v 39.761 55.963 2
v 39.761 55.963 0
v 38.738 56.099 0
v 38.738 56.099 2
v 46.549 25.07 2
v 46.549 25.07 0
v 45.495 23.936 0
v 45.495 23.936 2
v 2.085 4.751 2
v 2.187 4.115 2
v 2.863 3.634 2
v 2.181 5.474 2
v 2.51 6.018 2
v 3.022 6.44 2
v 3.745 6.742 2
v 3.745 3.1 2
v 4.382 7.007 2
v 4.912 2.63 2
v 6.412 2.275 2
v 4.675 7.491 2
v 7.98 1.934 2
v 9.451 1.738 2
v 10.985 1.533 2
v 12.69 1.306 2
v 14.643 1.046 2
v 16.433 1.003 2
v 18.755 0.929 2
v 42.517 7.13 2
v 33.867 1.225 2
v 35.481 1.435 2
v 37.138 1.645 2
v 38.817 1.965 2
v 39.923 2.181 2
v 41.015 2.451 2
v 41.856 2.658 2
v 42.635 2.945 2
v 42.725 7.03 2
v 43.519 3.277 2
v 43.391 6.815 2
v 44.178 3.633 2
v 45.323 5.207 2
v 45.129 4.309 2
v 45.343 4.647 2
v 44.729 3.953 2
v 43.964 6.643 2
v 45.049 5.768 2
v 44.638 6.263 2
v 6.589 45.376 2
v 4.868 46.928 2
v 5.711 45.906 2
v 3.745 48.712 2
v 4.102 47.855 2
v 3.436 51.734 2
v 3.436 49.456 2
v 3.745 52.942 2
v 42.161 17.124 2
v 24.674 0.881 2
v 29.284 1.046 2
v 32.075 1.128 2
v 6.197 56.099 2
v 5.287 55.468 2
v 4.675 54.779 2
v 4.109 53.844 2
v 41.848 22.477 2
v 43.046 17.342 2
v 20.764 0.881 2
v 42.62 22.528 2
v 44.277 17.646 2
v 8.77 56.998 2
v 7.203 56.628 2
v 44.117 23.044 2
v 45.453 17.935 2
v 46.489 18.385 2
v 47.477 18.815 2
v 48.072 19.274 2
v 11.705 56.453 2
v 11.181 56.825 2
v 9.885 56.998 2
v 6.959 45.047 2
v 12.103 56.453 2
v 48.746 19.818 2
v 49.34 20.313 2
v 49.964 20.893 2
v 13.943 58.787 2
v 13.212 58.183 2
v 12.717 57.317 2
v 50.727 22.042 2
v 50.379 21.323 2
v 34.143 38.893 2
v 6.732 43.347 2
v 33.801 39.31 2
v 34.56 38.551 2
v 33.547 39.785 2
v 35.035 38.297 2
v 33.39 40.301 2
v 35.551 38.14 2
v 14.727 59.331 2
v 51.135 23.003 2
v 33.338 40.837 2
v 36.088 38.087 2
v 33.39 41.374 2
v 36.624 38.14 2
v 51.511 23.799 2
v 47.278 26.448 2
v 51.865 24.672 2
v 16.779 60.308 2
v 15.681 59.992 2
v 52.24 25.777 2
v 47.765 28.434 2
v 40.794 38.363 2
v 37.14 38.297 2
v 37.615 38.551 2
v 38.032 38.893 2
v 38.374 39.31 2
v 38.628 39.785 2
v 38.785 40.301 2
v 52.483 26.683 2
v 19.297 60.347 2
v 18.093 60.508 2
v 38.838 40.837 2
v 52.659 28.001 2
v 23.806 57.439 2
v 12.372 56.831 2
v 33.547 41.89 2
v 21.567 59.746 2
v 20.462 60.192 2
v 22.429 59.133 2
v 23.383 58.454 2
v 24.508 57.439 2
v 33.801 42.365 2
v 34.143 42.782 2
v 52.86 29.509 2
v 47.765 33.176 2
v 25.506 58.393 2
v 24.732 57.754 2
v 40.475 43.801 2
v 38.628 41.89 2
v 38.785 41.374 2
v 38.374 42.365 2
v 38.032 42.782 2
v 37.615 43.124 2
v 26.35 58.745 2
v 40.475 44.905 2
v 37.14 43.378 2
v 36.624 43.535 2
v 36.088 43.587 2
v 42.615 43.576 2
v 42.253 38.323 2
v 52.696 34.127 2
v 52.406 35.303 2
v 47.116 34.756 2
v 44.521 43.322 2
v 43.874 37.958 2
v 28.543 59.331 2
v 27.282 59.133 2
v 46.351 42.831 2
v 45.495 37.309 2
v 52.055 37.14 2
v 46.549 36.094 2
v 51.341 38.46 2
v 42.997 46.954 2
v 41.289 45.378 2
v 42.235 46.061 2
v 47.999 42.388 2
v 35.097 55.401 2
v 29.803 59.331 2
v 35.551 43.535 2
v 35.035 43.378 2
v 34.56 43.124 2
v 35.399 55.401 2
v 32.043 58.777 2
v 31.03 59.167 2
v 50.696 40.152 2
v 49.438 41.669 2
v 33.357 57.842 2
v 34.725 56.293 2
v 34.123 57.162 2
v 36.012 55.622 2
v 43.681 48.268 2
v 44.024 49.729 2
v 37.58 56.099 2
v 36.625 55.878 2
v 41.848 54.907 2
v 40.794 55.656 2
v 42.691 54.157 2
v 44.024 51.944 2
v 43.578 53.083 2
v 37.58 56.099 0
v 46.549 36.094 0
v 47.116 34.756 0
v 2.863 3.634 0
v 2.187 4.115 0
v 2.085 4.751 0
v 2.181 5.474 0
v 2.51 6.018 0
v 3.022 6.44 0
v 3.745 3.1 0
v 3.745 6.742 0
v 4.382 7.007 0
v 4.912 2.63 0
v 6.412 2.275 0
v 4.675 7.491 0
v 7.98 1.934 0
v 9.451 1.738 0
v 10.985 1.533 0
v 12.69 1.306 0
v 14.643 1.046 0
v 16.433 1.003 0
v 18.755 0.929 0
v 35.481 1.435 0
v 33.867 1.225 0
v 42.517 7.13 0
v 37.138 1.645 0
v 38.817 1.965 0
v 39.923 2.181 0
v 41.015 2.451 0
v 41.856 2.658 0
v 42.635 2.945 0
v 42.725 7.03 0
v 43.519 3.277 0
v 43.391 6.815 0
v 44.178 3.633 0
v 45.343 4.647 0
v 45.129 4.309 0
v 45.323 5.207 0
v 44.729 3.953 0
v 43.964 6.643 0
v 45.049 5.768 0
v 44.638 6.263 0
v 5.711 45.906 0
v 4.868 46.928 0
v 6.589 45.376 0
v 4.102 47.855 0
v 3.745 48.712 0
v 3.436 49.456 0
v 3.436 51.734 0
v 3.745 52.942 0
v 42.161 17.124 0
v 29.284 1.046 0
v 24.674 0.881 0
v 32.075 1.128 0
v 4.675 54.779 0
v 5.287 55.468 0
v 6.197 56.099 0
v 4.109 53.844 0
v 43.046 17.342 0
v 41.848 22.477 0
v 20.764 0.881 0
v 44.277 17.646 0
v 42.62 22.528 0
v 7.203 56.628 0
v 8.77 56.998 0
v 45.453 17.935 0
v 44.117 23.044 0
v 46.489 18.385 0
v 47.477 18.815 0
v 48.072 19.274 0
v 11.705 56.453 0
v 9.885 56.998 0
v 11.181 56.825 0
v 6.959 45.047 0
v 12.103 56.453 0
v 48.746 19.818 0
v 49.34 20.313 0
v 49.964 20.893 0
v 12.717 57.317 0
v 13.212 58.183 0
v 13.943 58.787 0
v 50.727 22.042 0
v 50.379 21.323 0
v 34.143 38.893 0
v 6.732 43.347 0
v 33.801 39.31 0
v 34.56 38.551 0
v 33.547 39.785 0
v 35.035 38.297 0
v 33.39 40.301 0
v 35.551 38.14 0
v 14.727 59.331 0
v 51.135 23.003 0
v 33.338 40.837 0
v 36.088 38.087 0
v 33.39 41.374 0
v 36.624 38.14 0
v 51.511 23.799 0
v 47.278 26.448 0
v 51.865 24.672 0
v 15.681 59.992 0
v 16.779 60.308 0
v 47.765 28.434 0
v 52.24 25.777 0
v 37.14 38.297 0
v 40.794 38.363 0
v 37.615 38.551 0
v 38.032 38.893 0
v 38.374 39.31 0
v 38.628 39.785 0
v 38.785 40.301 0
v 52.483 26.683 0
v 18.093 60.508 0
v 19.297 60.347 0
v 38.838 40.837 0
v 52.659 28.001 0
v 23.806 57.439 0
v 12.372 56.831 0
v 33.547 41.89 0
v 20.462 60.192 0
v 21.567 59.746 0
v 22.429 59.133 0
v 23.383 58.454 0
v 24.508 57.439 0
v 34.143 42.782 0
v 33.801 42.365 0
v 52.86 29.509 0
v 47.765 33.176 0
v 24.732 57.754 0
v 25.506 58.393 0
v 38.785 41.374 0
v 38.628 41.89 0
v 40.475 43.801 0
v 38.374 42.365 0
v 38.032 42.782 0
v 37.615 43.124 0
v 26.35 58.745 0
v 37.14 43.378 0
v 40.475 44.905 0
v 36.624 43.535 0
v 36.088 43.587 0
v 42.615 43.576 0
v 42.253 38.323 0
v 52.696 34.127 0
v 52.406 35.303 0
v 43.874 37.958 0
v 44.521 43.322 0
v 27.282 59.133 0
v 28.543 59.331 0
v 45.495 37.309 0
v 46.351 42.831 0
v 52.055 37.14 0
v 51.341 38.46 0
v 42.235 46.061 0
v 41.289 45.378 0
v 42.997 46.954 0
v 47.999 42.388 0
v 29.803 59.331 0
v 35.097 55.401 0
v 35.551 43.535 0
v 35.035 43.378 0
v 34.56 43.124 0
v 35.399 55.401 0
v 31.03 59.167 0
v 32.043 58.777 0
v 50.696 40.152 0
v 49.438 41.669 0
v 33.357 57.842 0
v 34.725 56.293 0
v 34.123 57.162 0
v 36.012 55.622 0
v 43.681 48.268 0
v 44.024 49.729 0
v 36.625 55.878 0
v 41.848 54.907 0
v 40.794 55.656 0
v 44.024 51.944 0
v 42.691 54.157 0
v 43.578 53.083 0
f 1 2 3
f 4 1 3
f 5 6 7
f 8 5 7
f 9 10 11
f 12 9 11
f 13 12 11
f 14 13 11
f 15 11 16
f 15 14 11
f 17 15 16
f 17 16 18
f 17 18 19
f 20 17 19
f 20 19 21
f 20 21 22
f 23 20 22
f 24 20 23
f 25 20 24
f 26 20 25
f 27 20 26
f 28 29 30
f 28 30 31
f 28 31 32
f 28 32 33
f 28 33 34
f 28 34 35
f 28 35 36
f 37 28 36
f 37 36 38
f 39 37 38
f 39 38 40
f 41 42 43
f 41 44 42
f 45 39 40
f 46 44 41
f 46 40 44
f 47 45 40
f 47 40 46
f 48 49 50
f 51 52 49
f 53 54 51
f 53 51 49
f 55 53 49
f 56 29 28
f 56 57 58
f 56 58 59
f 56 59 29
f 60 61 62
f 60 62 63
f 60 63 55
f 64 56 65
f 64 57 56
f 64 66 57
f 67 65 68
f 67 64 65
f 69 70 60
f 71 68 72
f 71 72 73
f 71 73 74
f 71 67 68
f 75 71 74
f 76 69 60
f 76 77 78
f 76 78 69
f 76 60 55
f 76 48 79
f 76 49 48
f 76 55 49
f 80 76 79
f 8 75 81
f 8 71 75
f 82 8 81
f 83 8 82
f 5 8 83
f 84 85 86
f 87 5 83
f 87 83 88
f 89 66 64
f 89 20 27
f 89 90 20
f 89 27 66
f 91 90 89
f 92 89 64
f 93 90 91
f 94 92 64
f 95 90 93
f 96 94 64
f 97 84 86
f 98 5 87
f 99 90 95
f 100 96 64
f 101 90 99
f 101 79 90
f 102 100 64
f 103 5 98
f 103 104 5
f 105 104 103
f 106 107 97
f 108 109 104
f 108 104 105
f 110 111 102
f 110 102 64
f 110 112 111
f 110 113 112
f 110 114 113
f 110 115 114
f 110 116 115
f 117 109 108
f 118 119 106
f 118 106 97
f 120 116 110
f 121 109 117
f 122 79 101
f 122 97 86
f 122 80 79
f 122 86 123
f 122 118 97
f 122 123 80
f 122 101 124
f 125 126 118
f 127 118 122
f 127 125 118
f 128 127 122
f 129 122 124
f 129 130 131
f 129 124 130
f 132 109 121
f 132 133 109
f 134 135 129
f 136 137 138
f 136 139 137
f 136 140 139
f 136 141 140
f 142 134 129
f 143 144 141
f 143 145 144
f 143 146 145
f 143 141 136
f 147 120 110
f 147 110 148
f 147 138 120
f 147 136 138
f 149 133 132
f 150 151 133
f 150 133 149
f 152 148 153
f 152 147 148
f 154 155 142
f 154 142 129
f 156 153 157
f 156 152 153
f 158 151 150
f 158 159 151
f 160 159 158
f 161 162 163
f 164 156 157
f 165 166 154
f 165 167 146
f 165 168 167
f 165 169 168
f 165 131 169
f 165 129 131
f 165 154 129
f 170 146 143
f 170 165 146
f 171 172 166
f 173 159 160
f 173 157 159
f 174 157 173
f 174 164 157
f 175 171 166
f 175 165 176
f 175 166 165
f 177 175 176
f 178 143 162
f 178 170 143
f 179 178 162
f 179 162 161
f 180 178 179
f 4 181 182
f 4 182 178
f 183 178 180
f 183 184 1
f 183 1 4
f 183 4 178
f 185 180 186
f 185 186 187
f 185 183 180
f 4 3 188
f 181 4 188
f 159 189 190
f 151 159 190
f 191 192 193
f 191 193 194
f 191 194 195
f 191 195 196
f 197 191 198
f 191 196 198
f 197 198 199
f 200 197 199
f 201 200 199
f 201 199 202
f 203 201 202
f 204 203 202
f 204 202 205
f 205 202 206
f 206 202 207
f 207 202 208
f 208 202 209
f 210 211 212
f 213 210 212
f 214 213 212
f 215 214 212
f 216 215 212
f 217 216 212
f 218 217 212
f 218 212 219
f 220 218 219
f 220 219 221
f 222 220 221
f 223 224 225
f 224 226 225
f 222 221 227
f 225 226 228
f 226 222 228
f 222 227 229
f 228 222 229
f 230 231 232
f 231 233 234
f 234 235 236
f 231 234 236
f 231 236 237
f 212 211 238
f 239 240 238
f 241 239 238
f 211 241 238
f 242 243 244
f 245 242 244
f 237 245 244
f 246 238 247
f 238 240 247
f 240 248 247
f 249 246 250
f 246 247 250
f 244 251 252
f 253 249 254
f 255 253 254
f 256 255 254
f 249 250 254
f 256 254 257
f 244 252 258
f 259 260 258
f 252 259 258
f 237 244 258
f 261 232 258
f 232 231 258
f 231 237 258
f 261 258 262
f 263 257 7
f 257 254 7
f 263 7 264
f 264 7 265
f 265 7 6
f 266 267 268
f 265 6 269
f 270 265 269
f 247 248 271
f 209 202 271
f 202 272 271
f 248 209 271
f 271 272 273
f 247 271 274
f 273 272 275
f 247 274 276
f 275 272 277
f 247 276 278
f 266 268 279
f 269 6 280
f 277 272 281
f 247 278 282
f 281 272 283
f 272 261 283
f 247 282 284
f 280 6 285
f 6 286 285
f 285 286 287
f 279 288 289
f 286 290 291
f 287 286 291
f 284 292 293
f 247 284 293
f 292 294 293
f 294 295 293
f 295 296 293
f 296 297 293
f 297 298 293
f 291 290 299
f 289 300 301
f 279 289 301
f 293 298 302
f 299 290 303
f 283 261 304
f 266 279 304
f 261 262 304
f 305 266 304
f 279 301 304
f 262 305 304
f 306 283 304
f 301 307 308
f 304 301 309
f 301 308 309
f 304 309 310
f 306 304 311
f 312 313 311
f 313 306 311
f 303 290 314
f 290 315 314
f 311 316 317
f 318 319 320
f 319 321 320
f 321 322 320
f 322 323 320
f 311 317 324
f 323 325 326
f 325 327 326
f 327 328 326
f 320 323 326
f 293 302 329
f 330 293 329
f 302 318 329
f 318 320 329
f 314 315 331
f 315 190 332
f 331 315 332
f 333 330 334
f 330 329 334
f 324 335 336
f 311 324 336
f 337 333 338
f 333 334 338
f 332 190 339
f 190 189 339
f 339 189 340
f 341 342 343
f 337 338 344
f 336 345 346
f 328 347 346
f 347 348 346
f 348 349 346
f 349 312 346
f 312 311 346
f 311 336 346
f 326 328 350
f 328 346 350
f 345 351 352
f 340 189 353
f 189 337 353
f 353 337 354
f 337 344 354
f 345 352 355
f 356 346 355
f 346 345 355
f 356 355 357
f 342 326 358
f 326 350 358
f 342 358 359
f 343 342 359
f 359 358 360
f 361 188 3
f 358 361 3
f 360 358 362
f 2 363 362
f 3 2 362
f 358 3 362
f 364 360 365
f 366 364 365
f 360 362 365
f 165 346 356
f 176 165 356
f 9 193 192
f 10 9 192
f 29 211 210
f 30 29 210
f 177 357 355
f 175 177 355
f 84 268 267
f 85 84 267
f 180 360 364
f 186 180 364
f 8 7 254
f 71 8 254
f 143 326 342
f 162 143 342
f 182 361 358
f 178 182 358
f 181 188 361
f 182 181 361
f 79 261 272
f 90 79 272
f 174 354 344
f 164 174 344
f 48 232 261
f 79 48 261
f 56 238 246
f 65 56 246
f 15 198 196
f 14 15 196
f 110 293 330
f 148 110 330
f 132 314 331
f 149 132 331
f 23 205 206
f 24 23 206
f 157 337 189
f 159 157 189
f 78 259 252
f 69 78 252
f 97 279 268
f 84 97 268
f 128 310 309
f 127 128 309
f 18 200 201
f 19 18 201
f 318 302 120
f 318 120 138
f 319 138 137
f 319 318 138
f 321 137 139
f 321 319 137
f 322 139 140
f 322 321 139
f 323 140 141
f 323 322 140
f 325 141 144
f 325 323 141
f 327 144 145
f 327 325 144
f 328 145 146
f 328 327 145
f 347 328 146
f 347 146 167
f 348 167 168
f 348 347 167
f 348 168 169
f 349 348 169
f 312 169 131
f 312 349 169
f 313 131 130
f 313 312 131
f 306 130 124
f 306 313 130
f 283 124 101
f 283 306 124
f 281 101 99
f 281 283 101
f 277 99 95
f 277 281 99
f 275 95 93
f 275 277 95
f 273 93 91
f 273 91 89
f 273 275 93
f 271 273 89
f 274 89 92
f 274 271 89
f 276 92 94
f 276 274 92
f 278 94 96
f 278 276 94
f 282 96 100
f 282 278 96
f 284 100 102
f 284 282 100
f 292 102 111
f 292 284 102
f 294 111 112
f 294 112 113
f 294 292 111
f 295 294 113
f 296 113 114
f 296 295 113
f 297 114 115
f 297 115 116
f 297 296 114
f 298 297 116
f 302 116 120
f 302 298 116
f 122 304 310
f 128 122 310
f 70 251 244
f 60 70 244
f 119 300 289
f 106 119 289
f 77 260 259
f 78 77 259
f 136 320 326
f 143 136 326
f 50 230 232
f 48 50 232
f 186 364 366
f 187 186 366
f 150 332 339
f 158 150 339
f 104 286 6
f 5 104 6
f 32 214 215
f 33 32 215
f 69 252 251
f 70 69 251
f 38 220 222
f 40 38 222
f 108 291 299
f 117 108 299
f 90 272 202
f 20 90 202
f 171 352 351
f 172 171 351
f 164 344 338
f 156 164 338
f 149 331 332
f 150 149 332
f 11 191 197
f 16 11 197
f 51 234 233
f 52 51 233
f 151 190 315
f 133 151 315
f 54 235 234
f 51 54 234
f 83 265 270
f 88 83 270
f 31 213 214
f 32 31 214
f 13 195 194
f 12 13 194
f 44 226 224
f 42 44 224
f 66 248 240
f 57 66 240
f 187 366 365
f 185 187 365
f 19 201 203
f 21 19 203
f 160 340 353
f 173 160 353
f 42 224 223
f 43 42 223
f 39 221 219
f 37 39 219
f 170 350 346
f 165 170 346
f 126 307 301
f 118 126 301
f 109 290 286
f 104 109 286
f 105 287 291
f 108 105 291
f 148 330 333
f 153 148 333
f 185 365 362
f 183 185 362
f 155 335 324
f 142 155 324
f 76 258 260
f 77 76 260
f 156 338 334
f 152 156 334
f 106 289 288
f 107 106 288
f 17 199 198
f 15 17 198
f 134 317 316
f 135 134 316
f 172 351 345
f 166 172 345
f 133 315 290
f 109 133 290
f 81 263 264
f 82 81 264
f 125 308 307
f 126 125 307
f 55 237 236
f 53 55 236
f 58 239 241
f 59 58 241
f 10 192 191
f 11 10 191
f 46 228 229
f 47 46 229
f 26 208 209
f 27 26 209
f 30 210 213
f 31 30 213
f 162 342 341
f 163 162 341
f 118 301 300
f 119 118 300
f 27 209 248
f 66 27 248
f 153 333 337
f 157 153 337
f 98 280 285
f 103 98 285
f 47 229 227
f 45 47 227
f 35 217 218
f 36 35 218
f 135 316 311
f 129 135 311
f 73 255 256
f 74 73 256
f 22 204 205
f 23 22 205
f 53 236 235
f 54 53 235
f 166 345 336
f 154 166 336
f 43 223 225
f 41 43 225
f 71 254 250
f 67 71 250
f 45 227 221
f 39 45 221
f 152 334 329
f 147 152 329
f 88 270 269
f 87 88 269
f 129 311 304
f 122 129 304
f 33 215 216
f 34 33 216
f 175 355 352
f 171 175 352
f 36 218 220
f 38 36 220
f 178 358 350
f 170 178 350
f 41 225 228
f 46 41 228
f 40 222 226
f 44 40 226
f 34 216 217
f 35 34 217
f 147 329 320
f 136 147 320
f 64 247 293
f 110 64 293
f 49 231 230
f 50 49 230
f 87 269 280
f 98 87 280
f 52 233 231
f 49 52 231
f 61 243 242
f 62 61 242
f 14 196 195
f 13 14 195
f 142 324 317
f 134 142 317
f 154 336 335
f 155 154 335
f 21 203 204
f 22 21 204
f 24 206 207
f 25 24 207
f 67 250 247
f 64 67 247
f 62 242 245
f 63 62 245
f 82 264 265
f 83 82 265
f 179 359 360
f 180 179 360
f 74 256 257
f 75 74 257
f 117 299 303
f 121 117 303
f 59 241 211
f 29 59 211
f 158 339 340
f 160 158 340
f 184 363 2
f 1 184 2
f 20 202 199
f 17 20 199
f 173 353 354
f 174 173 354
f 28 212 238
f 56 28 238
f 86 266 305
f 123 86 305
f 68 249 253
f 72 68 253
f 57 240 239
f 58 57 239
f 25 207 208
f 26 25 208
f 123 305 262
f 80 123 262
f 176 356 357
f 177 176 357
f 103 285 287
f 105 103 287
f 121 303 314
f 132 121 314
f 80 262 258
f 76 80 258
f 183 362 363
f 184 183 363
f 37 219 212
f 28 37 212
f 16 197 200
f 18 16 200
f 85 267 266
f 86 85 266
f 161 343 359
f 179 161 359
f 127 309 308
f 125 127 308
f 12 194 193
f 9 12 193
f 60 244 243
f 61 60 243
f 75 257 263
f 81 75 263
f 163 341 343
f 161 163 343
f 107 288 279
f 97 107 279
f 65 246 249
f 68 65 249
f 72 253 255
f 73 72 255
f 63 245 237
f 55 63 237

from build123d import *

# Parameters (mm, degrees)
F0_R     = 2.75
F1_DEPTH = 2


with BuildPart() as f1:
    # F0 (on Top) → F1 (new body)
    with BuildSketch(Plane.XY):
        Polygon((42.614597, 43.575729), (40.474674, 43.801061), (40.474674, 44.904759), (41.289306, 45.377769), (42.235331, 46.061014), (42.997407, 46.954477), (43.680649, 48.268405), (44.023932, 49.729318), (44.023932, 50.649449), (44.023932, 51.944449), (43.5775, 53.083367), (42.691444, 54.156854), (41.847845, 54.906591), (40.794143, 55.656328), (39.760655, 55.963038), (38.738284, 56.099354), (37.5796, 56.099354), (36.625389, 55.877841), (36.011968, 55.622249), (35.398544, 55.400736), (35.096974, 55.400736), (34.725139, 56.293141), (34.122785, 57.161563), (33.357102, 57.842052), (32.042509, 58.77742), (31.030484, 59.166825), (29.802747, 59.330523), (28.542718, 59.330523), (27.281797, 59.132746), (26.350169, 58.744568), (25.505657, 58.392688), (24.732415, 57.754455), (24.507659, 57.438576), (23.805742, 57.438576), (23.38257, 58.454189), (22.428905, 59.132746), (21.566604, 59.746296), (20.461918, 60.19183), (19.297132, 60.347135), (18.092803, 60.507712), (16.778593, 60.307712), (15.680915, 59.992126), (14.727073, 59.330523), (13.943266, 58.78686), (13.211777, 58.18309), (12.717188, 57.316541), (12.371887, 56.831245), (12.102754, 56.452998), (11.70455, 56.452998), (11.181221, 56.82536), (9.885113, 56.998174), (8.770078, 56.998174), (7.202732, 56.627827), (6.197297, 56.099354), (5.286899, 55.467885), (4.67496, 54.779335), (4.109085, 53.843544), (3.745405, 52.941812), (3.43555, 51.734029), (3.43555, 50.828029), (3.43555, 49.455927), (3.745405, 48.712276), (4.102451, 47.855367), (4.868277, 46.927541), (5.71123, 45.906275), (6.588969, 45.375504), (6.958782, 45.046838), (6.732116, 43.34684), (4.67496, 7.491453), (4.382145, 7.007223), (3.745405, 6.741914), (3.021601, 6.440329), (2.510416, 6.018397), (2.181404, 5.474309), (2.084989, 4.751196), (2.186613, 4.115137), (2.862741, 3.634054), (3.745405, 3.100305), (4.911553, 2.629983), (6.412406, 2.274872), (7.980039, 1.934082), (9.45109, 1.737943), (10.984644, 1.53347), (12.690081, 1.306079), (14.643297, 1.04565), (16.432547, 1.003336), (18.755258, 0.929009), (20.764264, 0.881497), (24.674177, 0.881497), (29.284421, 1.04565), (32.075043, 1.127764), (33.867482, 1.224696), (35.480599, 1.434622), (37.137908, 1.644548), (38.817317, 1.964962), (39.922824, 2.181308), (41.015109, 2.450639), (41.856079, 2.658001), (42.635252, 2.945225), (43.519151, 3.276687), (44.177526, 3.632565), (44.729134, 3.952855), (45.129498, 4.308733), (45.343027, 4.646817), (45.323095, 5.206614), (45.049425, 5.767831), (44.637698, 6.263237), (43.964259, 6.642941), (43.391121, 6.814882), (42.72485, 7.02981), (42.517087, 7.130109), (42.161251, 17.123776), (43.045596, 17.341834), (44.277249, 17.645529), (45.452933, 17.935424), (46.488645, 18.385407), (47.477306, 18.81526), (48.072154, 19.273718), (48.74559, 19.818199), (49.340221, 20.31253), (49.963509, 20.892833), (50.379035, 21.322686), (50.726546, 22.042045), (51.13535, 23.003285), (51.511009, 23.798795), (51.864567, 24.671646), (52.240226, 25.77652), (52.483299, 26.682517), (52.659055, 28.000691), (52.860135, 29.508797), (52.695712, 34.126613), (52.405689, 35.302818), (52.055256, 37.139574), (51.341367, 38.460271), (50.695767, 40.152436), (49.438013, 41.668941), (47.999089, 42.388402), (46.350579, 42.830686), (44.521046, 43.321537), align=None)
        Polygon((41.847845, 22.476589), (40.794143, 38.363158), (42.253113, 38.322631), (43.874192, 37.957887), (45.495268, 37.309456), (46.548973, 36.093648), (47.116347, 34.756259), (47.764781, 33.175707), (47.764781, 31.39252), (47.764781, 28.434052), (47.278455, 26.448232), (46.548973, 25.070315), (45.495268, 23.935562), (44.117352, 23.043968), (42.619834, 22.527792), align=None, mode=Mode.SUBTRACT)
        with Locations((36.087643, 40.83737)):
            Circle(F0_R, mode=Mode.SUBTRACT)
    extrude(amount=F1_DEPTH)


solid = f1.part
